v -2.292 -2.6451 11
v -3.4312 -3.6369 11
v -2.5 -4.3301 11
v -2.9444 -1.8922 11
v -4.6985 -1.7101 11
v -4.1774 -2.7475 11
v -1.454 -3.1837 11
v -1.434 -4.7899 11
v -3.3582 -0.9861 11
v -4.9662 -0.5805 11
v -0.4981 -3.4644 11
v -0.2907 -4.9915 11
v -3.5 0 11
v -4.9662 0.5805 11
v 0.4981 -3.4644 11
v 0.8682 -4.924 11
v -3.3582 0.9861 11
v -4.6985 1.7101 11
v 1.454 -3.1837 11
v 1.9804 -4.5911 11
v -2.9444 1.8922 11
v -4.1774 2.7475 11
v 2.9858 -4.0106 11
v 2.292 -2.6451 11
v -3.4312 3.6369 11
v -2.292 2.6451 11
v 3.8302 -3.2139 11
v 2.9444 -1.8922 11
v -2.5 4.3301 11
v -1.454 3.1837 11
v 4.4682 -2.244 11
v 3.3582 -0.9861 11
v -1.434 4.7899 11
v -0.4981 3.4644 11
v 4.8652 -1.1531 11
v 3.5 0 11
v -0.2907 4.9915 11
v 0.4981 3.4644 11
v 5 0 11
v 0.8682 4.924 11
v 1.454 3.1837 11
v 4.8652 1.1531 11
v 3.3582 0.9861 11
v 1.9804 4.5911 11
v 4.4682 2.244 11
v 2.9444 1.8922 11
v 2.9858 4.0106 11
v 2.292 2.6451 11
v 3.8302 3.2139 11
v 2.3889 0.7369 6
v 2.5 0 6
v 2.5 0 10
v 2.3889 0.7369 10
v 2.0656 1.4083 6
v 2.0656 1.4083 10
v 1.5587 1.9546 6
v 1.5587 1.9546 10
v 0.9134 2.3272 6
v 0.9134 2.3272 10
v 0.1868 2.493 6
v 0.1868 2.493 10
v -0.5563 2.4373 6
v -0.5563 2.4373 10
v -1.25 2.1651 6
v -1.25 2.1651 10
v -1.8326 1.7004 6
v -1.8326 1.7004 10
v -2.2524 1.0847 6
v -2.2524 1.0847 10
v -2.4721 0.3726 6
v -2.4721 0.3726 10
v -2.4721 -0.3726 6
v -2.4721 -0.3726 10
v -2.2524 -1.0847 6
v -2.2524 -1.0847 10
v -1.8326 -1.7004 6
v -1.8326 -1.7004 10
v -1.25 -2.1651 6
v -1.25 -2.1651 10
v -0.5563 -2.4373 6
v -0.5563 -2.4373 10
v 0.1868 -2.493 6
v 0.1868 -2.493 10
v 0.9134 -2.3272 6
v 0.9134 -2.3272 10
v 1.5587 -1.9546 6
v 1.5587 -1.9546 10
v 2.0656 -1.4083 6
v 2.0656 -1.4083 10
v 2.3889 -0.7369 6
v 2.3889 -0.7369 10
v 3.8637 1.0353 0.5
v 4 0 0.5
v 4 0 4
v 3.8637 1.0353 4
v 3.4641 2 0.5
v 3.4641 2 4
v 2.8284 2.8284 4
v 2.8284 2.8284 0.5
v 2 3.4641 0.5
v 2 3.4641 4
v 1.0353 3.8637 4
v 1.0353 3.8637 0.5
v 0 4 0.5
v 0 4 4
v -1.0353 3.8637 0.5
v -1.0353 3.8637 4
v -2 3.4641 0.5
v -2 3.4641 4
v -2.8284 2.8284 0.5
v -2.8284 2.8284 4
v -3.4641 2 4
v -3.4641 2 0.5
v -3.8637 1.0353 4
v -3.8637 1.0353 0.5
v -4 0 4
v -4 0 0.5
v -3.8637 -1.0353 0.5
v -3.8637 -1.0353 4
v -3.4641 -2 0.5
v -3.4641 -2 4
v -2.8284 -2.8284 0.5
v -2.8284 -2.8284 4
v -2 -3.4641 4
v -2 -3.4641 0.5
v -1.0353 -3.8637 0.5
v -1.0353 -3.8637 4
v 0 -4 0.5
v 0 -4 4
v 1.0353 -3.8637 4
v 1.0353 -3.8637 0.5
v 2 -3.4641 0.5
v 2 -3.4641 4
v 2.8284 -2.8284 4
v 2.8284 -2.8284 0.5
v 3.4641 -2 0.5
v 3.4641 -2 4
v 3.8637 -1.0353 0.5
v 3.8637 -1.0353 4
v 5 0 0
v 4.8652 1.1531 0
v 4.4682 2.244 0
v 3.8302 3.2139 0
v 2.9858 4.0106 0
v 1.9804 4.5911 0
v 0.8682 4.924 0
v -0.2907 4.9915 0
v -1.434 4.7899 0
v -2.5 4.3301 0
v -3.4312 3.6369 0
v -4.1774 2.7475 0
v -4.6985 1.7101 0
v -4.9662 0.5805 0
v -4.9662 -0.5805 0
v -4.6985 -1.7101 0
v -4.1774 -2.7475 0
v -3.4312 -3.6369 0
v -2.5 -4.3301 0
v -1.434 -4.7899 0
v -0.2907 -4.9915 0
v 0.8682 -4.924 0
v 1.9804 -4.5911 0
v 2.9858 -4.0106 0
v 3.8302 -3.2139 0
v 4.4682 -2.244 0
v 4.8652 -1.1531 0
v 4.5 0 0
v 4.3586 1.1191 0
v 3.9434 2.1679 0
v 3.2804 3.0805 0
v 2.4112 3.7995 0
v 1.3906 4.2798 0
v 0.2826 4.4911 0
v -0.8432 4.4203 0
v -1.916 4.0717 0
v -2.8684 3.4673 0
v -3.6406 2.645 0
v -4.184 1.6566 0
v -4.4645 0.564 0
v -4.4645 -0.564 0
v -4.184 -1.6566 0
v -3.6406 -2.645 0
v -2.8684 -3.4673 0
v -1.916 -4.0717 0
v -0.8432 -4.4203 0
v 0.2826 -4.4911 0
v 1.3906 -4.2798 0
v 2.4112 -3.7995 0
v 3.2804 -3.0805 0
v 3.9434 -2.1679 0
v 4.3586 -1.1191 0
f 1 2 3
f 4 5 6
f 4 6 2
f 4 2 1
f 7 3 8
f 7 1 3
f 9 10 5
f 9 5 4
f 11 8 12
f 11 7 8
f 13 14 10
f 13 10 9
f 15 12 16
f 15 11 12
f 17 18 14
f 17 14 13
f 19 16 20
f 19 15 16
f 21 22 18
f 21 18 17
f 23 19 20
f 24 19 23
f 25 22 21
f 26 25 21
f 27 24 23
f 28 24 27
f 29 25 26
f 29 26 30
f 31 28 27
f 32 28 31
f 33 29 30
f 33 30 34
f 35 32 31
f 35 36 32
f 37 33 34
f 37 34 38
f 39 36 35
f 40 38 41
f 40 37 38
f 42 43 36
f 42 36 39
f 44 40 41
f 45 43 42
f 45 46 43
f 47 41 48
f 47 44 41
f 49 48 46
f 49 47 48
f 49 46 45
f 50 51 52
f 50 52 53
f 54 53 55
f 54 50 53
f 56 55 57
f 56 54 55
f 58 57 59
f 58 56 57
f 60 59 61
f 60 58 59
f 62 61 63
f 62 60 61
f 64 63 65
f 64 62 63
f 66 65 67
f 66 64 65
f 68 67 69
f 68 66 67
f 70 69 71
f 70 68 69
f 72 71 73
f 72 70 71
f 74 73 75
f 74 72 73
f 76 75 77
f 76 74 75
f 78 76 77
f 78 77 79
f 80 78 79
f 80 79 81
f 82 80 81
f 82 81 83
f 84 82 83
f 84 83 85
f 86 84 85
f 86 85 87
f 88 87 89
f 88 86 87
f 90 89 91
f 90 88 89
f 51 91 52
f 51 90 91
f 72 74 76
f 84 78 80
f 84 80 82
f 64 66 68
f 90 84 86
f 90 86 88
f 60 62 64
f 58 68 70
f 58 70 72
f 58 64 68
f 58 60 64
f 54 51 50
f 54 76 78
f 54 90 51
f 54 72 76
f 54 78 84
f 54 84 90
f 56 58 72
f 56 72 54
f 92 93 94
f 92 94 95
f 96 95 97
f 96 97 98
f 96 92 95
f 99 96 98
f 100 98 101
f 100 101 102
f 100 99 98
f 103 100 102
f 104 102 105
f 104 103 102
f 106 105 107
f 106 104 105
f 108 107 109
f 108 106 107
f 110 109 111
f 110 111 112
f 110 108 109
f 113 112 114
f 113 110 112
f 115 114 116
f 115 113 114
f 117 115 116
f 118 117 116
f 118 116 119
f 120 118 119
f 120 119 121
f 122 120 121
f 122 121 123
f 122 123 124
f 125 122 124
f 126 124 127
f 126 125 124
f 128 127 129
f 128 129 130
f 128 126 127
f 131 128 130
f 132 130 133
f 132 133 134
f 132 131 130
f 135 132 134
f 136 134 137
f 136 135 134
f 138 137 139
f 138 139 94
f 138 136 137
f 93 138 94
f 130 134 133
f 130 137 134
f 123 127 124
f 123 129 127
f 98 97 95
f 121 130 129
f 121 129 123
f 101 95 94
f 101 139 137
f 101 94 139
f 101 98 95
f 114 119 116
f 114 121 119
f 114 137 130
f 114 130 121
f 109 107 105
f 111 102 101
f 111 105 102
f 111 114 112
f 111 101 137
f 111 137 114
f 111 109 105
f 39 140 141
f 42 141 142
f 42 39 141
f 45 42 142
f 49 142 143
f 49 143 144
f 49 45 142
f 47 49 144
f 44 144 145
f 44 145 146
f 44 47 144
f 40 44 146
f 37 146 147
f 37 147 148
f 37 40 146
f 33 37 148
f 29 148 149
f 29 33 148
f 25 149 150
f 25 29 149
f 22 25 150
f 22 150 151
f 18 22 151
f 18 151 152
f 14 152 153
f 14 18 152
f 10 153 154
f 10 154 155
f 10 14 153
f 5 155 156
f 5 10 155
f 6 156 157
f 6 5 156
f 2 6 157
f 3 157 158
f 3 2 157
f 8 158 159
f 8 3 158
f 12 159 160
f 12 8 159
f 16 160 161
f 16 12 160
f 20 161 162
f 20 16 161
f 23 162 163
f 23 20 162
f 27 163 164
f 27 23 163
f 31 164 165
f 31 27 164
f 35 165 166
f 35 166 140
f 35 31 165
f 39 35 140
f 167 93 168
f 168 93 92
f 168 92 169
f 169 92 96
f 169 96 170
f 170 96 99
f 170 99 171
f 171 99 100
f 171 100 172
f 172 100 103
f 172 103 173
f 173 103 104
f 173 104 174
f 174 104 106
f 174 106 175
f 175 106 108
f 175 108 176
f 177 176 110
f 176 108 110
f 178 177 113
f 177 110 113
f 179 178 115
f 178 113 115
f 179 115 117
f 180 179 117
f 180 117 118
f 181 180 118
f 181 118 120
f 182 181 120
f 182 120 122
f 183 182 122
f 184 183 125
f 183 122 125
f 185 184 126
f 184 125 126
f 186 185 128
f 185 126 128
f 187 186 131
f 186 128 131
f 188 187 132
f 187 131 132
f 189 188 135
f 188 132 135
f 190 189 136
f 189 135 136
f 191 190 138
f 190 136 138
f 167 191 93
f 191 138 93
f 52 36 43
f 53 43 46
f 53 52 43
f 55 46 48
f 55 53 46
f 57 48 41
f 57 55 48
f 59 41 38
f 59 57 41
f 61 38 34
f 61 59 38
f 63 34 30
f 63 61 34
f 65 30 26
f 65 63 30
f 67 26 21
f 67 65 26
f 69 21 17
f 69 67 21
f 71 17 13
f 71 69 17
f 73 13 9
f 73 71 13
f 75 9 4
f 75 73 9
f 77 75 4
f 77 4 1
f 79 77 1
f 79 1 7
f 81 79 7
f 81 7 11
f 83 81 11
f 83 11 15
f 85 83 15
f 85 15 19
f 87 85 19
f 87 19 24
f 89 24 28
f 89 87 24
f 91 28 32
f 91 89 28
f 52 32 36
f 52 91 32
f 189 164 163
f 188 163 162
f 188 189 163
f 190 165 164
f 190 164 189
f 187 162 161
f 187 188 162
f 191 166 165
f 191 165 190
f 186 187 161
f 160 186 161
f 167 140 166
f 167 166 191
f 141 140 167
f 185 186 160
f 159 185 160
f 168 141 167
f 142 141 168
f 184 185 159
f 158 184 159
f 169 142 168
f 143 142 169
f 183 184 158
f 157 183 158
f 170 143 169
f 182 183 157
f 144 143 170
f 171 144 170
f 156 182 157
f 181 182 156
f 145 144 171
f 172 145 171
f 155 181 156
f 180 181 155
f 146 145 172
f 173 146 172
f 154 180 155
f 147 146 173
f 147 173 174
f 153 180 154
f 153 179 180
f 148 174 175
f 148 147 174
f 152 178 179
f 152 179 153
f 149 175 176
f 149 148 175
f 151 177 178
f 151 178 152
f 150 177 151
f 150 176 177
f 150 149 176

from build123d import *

# Parameters (mm, degrees)
F2_SIZE = 1
F3_SIZE = 0.5


with BuildPart() as f1:
    # F0 (on Front) → F1 (revolve)
    with BuildSketch(Plane.XZ):
        Polygon((4, 4), (4, 0), (5, 0), (5, 11), (2.5, 11), (2.5, 6), (0, 6), (0, 4), align=None)
    revolve(axis=Axis((0, 0, 2), (0, 0, 1)))

    # F2
    f2_edges = [f1.edges().sort_by_distance(p)[0] for p in [
        (-2.5, 0, 11),
    ]]
    chamfer(f2_edges, length=F2_SIZE)

    # F3
    f3_edges = [f1.edges().sort_by_distance(p)[0] for p in [
        (-4, 0, 0),
    ]]
    chamfer(f3_edges, length=F3_SIZE)


solid = f1.part
